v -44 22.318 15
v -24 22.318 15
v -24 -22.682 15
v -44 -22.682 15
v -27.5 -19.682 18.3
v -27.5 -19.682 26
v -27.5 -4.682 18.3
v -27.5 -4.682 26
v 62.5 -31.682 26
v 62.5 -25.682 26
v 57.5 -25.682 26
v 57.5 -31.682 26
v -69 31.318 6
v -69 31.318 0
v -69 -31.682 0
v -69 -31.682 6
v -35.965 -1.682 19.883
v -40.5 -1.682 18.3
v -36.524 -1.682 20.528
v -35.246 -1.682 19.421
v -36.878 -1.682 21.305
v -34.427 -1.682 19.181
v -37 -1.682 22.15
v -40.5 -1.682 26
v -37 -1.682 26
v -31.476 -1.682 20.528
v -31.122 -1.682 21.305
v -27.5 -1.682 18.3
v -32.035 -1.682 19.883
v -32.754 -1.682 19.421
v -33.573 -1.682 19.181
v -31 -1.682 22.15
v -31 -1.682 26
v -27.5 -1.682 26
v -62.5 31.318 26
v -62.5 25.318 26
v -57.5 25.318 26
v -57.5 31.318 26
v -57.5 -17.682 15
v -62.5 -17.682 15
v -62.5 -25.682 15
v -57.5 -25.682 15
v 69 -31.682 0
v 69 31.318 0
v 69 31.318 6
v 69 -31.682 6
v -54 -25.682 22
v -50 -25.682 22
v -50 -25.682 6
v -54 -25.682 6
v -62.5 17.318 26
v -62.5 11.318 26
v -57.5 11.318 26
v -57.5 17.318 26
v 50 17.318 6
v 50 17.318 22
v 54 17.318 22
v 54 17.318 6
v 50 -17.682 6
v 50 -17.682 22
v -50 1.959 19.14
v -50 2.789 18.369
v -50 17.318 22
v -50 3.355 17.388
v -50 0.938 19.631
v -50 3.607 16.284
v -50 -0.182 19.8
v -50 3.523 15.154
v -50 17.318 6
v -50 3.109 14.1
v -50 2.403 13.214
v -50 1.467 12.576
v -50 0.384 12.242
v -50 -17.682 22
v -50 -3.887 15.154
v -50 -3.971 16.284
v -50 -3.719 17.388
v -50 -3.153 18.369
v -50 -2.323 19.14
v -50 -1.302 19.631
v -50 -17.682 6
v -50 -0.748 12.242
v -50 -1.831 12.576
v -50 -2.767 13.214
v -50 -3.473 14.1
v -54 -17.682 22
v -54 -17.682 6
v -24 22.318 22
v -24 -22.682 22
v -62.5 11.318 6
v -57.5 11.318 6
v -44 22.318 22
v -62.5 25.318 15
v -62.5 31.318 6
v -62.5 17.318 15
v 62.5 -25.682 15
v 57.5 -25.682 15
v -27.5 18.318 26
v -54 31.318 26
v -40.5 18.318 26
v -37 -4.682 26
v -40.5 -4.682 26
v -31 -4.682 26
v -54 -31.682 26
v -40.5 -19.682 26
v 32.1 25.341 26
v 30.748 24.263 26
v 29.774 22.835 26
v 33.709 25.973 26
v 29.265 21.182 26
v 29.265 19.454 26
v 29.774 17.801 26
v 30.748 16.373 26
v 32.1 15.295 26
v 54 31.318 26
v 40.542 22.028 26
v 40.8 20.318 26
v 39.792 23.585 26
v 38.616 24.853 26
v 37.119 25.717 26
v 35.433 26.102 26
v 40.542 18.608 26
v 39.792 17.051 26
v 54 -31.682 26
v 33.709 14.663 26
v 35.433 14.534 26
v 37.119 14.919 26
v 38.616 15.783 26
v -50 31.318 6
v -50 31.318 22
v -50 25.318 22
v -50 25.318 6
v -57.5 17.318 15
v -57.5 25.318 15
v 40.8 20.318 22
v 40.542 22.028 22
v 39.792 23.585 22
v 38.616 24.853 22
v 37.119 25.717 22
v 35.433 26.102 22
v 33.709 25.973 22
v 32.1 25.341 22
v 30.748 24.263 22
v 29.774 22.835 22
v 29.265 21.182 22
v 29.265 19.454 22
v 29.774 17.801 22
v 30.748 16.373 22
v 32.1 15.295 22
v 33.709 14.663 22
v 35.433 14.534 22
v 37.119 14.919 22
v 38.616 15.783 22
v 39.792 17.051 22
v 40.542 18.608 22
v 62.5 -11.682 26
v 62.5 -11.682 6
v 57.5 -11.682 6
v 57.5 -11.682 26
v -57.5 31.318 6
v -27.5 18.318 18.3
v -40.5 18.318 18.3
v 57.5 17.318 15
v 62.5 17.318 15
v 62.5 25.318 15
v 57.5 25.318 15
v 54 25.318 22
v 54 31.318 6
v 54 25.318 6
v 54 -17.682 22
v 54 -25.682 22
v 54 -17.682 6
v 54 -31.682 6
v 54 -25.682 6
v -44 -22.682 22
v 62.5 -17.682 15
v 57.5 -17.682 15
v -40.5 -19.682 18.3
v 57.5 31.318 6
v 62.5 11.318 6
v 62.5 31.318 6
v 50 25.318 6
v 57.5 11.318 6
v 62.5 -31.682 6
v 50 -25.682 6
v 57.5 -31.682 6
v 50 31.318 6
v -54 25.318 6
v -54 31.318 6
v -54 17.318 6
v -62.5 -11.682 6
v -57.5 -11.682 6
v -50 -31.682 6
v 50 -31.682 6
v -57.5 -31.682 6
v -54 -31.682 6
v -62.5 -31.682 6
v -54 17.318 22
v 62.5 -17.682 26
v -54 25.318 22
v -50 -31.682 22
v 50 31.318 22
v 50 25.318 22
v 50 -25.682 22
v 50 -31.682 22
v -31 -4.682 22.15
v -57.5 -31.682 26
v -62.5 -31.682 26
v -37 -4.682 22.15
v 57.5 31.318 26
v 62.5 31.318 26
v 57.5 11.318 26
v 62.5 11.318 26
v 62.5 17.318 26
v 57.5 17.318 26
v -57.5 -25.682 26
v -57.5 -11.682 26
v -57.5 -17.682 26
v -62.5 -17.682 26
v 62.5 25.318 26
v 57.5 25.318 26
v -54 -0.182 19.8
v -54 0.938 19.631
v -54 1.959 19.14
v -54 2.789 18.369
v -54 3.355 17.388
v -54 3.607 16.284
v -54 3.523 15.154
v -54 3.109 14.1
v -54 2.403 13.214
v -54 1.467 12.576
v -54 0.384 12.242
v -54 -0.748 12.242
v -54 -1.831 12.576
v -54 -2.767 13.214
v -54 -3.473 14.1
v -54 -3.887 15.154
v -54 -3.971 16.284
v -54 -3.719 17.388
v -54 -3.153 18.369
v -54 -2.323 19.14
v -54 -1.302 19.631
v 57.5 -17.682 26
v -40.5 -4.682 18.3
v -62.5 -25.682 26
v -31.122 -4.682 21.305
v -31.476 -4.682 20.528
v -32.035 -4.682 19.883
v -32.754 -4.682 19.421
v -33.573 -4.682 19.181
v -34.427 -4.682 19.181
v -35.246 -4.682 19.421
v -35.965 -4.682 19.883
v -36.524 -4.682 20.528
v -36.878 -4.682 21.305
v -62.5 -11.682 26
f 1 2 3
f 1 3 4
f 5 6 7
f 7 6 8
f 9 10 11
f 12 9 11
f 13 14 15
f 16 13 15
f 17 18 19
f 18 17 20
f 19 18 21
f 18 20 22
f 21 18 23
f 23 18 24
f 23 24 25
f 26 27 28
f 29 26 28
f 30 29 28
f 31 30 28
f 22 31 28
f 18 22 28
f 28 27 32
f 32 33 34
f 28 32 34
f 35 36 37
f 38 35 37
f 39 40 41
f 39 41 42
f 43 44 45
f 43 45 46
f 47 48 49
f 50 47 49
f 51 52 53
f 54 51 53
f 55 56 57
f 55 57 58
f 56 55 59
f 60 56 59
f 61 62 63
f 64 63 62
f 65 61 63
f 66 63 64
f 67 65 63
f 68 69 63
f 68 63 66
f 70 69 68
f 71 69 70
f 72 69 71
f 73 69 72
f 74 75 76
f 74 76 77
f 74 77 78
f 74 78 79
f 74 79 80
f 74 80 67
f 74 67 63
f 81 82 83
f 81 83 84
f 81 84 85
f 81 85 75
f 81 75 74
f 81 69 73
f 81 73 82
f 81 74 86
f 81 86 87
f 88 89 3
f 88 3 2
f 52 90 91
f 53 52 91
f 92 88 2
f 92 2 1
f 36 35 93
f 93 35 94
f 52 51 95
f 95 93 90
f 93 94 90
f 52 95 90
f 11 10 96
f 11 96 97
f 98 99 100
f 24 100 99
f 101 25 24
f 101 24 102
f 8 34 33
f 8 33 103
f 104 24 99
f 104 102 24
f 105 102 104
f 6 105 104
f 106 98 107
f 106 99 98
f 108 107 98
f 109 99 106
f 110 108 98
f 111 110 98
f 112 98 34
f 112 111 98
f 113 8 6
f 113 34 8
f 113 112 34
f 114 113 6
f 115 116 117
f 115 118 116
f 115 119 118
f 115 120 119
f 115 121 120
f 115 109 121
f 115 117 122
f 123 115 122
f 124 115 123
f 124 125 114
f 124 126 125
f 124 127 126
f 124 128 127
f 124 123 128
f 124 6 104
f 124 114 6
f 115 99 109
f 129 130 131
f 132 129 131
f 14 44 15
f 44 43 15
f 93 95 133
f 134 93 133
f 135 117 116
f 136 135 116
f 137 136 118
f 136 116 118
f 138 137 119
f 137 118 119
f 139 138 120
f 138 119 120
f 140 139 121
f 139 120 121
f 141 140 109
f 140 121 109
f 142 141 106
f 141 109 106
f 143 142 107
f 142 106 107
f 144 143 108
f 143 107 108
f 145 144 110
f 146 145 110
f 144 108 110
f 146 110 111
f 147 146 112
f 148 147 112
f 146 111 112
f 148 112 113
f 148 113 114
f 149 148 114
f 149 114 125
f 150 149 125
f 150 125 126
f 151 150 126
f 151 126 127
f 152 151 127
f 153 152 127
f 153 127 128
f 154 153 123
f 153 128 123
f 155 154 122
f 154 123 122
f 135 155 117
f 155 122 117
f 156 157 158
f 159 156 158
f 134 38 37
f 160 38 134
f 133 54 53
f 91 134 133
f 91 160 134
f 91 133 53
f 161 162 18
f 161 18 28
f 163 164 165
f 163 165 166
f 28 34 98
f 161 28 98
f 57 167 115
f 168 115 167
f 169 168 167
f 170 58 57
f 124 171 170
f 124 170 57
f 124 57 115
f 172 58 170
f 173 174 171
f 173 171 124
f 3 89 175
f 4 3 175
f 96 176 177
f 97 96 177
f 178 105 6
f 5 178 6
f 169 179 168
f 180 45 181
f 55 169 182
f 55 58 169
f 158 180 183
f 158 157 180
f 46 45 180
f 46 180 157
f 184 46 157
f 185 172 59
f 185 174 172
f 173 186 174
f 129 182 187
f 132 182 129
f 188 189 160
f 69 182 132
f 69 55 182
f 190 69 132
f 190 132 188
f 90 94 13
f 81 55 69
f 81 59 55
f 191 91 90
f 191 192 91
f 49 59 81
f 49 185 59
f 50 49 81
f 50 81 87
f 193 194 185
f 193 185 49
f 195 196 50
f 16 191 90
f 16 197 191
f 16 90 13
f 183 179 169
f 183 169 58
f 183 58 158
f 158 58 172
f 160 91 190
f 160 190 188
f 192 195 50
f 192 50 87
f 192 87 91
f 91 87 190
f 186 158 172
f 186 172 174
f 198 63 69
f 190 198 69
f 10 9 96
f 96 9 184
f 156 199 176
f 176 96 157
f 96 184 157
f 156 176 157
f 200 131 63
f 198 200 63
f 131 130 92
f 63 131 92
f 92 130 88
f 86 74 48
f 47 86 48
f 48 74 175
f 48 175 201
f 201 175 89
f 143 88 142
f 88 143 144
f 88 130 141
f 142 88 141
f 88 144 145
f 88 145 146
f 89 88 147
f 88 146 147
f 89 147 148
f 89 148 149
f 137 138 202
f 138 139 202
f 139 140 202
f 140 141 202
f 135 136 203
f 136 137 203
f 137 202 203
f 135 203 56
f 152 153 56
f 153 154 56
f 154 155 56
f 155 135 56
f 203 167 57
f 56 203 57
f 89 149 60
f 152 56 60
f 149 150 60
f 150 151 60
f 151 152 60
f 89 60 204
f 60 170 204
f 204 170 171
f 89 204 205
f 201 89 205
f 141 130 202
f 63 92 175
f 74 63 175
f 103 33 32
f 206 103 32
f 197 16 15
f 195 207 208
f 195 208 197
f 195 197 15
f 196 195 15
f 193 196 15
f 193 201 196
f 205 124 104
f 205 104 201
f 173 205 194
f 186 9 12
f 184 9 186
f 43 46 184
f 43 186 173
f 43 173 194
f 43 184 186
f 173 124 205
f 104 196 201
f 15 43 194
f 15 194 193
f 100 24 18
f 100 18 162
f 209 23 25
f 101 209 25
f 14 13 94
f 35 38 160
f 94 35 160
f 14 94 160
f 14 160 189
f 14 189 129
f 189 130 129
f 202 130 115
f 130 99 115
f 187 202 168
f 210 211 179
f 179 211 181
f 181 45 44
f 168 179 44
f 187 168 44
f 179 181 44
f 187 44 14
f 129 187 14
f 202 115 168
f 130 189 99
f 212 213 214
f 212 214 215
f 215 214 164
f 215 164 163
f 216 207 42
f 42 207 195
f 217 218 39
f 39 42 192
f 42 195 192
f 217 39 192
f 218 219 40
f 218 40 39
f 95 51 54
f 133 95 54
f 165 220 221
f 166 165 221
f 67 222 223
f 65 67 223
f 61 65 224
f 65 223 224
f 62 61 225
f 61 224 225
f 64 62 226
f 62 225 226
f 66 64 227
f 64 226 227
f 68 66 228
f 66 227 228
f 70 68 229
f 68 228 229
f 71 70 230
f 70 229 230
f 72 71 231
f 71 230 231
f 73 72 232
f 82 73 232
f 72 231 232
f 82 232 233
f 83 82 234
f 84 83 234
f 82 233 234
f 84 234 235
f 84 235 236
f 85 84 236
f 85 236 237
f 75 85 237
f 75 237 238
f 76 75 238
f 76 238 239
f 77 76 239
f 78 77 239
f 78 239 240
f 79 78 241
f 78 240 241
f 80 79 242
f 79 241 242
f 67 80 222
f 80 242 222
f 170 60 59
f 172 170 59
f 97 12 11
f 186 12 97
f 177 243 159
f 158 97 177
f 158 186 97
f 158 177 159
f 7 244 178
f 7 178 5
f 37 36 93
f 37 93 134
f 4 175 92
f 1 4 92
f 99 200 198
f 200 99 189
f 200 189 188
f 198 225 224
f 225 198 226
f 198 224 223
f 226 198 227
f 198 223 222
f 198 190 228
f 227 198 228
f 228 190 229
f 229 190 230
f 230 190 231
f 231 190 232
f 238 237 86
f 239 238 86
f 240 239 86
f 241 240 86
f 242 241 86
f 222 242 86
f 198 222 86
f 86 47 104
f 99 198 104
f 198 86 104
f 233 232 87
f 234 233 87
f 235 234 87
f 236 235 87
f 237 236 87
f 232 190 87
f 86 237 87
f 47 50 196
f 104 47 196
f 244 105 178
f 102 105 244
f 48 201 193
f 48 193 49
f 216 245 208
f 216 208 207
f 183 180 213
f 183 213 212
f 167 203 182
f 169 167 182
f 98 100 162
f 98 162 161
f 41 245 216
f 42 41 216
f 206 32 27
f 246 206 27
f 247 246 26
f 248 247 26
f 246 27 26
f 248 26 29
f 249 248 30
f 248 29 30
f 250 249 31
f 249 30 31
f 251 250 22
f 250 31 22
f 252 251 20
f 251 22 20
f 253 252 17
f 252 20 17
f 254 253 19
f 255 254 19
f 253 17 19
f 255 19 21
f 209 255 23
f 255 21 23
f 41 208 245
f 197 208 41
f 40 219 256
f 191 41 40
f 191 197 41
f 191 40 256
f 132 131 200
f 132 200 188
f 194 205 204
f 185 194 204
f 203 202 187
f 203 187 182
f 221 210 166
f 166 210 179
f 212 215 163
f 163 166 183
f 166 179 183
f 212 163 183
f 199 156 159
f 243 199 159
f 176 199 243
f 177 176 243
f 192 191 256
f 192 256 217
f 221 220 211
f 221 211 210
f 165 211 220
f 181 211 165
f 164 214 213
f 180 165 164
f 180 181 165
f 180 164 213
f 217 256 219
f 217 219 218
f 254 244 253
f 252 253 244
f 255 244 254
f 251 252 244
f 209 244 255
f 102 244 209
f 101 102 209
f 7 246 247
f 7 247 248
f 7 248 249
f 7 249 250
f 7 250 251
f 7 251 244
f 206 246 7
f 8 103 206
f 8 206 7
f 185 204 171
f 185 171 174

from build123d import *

# Parameters (mm, degrees)
ESBO_O1_W                = 69
ESBO_O1_H                = 31.5
RESSALTO_EXTRUS_O1_DEPTH = 6
ESBO_O2_W                = 5
ESBO_O2_H                = 20
RESSALTO_EXTRUS_O2_DEPTH = 20
ESBO_O3_W                = 5
ESBO_O3_H                = 8
CORTE_EXTRUS_O1_DEPTH    = 11
ESBO_O4_W                = 4
ESBO_O4_H                = 31.5
RESSALTO_EXTRUS_O3_DEPTH = 20
ESBO_O5_W                = 16
ESBO_O5_H                = 8
CORTE_EXTRUS_O2_DEPTH    = 4
ESBO_O6_W                = 4
ESBO_O6_H                = 31.5
RESSALTO_EXTRUS_O4_DEPTH = 50
ESBO_O18_R               = 3.8
CORTE_EXTRUS_O3_DEPTH    = 4
ESBO_O19_R               = 5.8
CORTE_EXTRUS_O5_DEPTH    = 4
ESBO_O20_W               = 20
ESBO_O20_H               = 45
RESSALTO_EXTRUS_O9_DEPTH = 7
ESBO_O21_W               = 13
ESBO_O21_H               = 15
CORTE_EXTRUS_O6_DEPTH    = 7.7
ESBO_O22_W               = 13
ESBO_O22_H               = 20
CORTE_EXTRUS_O7_DEPTH    = 7.7
CORTE_EXTRUS_O9_DEPTH    = 3


with BuildPart() as part:
    # Esboço1 → Ressalto-extrusão1 (new body)
    with BuildSketch(Plane.XY):
        with Locations((-34.5, -15.931977108)):
            Rectangle(ESBO_O1_W, ESBO_O1_H)
    extrude(amount=RESSALTO_EXTRUS_O1_DEPTH)

    # Esboço2 → Ressalto-extrusão2 (add)
    with BuildSketch(Plane.XY.offset(6)):
        with Locations((-60, -21.681977108)):
            Rectangle(ESBO_O2_W, ESBO_O2_H)
    extrude(amount=RESSALTO_EXTRUS_O2_DEPTH)

    # Esboço3 → Corte-extrusão1 (cut)
    with BuildSketch(Plane.XY.offset(26)):
        with Locations((-60, -21.681977108)):
            Rectangle(ESBO_O3_W, ESBO_O3_H)
    extrude(amount=-CORTE_EXTRUS_O1_DEPTH, mode=Mode.SUBTRACT)

    # Esboço4 → Ressalto-extrusão3 (add)
    with BuildSketch(Plane.XY.offset(6)):
        with Locations((-52, -15.931977108)):
            Rectangle(ESBO_O4_W, ESBO_O4_H)
    extrude(amount=RESSALTO_EXTRUS_O3_DEPTH)

    # Esboço5 → Corte-extrusão2 (cut)
    with BuildSketch(Plane(origin=(-50, 0, 0), x_dir=(0, 0, -1), z_dir=(1, 0, 0))):
        with Locations((-14, -21.681977108)):
            Rectangle(ESBO_O5_W, ESBO_O5_H)
    extrude(amount=-CORTE_EXTRUS_O2_DEPTH, mode=Mode.SUBTRACT)

    # Esboço6 → Ressalto-extrusão4 (add)
    with BuildSketch(Plane(origin=(-50, 0, 0), x_dir=(0, 0, -1), z_dir=(1, 0, 0))):
        with Locations((-24, -15.931977108)):
            Rectangle(ESBO_O6_W, ESBO_O6_H)
    extrude(amount=RESSALTO_EXTRUS_O4_DEPTH)

    # Espelhar10: part across plane


with BuildPart() as part_1:
    add(part.part)
    add(part.part.mirror(Plane.ZX.offset(-0.181977108)))

    # Espelhar11: part across plane


with BuildPart() as part_2:
    add(part_1.part)
    add(part_1.part.mirror(Plane(origin=(0, 0, 0), x_dir=(0, 0, 1), z_dir=(1, 0, 0))))

    # Esboço18 → Corte-extrusão3 (cut)
    with BuildSketch(Plane.ZY.offset(54)):
        with Locations((16, -0.181977108)):
            Circle(ESBO_O18_R)
    extrude(amount=-CORTE_EXTRUS_O3_DEPTH, mode=Mode.SUBTRACT)

    # Esboço19 → Corte-extrusão5 (cut)
    with BuildSketch(Plane.XY.offset(26)):
        with Locations((35, 20.318022892)):
            Circle(ESBO_O19_R)
    extrude(amount=-CORTE_EXTRUS_O5_DEPTH, mode=Mode.SUBTRACT)

    # Esboço20 → Ressalto-extrusão9 (add)
    with BuildSketch(Plane(origin=(0, 0, 22), x_dir=(-1, 0, 0), z_dir=(0, 0, -1))):
        with Locations((34, -0.181977108)):
            Rectangle(ESBO_O20_W, ESBO_O20_H)
    extrude(amount=RESSALTO_EXTRUS_O9_DEPTH)

    # Esboço21 → Corte-extrusão6 (cut)
    with BuildSketch(Plane.XY.offset(26)):
        with Locations((-34, -12.181977108)):
            Rectangle(ESBO_O21_W, ESBO_O21_H)
    extrude(amount=-CORTE_EXTRUS_O6_DEPTH, mode=Mode.SUBTRACT)

    # Esboço22 → Corte-extrusão7 (cut)
    with BuildSketch(Plane.XY.offset(26)):
        with Locations((-34, 8.318022892)):
            Rectangle(ESBO_O22_W, ESBO_O22_H)
    extrude(amount=-CORTE_EXTRUS_O7_DEPTH, mode=Mode.SUBTRACT)

    # Esboço23 → Corte-extrusão9 (cut)
    with BuildSketch(Plane(origin=(0, -1.681977108, 0), x_dir=(1, 0, 0), z_dir=(0, 1, 0))):
        with BuildLine():
            Line((-31, -26), (-31, -22.15))
            ThreePointArc((-31, -22.15), (-34, -19.15), (-37, -22.15))
            Line((-37, -22.15), (-37, -26))
            Line((-37, -26), (-31, -26))
        make_face()
    extrude(amount=-CORTE_EXTRUS_O9_DEPTH, mode=Mode.SUBTRACT)


solid = part_2.part
